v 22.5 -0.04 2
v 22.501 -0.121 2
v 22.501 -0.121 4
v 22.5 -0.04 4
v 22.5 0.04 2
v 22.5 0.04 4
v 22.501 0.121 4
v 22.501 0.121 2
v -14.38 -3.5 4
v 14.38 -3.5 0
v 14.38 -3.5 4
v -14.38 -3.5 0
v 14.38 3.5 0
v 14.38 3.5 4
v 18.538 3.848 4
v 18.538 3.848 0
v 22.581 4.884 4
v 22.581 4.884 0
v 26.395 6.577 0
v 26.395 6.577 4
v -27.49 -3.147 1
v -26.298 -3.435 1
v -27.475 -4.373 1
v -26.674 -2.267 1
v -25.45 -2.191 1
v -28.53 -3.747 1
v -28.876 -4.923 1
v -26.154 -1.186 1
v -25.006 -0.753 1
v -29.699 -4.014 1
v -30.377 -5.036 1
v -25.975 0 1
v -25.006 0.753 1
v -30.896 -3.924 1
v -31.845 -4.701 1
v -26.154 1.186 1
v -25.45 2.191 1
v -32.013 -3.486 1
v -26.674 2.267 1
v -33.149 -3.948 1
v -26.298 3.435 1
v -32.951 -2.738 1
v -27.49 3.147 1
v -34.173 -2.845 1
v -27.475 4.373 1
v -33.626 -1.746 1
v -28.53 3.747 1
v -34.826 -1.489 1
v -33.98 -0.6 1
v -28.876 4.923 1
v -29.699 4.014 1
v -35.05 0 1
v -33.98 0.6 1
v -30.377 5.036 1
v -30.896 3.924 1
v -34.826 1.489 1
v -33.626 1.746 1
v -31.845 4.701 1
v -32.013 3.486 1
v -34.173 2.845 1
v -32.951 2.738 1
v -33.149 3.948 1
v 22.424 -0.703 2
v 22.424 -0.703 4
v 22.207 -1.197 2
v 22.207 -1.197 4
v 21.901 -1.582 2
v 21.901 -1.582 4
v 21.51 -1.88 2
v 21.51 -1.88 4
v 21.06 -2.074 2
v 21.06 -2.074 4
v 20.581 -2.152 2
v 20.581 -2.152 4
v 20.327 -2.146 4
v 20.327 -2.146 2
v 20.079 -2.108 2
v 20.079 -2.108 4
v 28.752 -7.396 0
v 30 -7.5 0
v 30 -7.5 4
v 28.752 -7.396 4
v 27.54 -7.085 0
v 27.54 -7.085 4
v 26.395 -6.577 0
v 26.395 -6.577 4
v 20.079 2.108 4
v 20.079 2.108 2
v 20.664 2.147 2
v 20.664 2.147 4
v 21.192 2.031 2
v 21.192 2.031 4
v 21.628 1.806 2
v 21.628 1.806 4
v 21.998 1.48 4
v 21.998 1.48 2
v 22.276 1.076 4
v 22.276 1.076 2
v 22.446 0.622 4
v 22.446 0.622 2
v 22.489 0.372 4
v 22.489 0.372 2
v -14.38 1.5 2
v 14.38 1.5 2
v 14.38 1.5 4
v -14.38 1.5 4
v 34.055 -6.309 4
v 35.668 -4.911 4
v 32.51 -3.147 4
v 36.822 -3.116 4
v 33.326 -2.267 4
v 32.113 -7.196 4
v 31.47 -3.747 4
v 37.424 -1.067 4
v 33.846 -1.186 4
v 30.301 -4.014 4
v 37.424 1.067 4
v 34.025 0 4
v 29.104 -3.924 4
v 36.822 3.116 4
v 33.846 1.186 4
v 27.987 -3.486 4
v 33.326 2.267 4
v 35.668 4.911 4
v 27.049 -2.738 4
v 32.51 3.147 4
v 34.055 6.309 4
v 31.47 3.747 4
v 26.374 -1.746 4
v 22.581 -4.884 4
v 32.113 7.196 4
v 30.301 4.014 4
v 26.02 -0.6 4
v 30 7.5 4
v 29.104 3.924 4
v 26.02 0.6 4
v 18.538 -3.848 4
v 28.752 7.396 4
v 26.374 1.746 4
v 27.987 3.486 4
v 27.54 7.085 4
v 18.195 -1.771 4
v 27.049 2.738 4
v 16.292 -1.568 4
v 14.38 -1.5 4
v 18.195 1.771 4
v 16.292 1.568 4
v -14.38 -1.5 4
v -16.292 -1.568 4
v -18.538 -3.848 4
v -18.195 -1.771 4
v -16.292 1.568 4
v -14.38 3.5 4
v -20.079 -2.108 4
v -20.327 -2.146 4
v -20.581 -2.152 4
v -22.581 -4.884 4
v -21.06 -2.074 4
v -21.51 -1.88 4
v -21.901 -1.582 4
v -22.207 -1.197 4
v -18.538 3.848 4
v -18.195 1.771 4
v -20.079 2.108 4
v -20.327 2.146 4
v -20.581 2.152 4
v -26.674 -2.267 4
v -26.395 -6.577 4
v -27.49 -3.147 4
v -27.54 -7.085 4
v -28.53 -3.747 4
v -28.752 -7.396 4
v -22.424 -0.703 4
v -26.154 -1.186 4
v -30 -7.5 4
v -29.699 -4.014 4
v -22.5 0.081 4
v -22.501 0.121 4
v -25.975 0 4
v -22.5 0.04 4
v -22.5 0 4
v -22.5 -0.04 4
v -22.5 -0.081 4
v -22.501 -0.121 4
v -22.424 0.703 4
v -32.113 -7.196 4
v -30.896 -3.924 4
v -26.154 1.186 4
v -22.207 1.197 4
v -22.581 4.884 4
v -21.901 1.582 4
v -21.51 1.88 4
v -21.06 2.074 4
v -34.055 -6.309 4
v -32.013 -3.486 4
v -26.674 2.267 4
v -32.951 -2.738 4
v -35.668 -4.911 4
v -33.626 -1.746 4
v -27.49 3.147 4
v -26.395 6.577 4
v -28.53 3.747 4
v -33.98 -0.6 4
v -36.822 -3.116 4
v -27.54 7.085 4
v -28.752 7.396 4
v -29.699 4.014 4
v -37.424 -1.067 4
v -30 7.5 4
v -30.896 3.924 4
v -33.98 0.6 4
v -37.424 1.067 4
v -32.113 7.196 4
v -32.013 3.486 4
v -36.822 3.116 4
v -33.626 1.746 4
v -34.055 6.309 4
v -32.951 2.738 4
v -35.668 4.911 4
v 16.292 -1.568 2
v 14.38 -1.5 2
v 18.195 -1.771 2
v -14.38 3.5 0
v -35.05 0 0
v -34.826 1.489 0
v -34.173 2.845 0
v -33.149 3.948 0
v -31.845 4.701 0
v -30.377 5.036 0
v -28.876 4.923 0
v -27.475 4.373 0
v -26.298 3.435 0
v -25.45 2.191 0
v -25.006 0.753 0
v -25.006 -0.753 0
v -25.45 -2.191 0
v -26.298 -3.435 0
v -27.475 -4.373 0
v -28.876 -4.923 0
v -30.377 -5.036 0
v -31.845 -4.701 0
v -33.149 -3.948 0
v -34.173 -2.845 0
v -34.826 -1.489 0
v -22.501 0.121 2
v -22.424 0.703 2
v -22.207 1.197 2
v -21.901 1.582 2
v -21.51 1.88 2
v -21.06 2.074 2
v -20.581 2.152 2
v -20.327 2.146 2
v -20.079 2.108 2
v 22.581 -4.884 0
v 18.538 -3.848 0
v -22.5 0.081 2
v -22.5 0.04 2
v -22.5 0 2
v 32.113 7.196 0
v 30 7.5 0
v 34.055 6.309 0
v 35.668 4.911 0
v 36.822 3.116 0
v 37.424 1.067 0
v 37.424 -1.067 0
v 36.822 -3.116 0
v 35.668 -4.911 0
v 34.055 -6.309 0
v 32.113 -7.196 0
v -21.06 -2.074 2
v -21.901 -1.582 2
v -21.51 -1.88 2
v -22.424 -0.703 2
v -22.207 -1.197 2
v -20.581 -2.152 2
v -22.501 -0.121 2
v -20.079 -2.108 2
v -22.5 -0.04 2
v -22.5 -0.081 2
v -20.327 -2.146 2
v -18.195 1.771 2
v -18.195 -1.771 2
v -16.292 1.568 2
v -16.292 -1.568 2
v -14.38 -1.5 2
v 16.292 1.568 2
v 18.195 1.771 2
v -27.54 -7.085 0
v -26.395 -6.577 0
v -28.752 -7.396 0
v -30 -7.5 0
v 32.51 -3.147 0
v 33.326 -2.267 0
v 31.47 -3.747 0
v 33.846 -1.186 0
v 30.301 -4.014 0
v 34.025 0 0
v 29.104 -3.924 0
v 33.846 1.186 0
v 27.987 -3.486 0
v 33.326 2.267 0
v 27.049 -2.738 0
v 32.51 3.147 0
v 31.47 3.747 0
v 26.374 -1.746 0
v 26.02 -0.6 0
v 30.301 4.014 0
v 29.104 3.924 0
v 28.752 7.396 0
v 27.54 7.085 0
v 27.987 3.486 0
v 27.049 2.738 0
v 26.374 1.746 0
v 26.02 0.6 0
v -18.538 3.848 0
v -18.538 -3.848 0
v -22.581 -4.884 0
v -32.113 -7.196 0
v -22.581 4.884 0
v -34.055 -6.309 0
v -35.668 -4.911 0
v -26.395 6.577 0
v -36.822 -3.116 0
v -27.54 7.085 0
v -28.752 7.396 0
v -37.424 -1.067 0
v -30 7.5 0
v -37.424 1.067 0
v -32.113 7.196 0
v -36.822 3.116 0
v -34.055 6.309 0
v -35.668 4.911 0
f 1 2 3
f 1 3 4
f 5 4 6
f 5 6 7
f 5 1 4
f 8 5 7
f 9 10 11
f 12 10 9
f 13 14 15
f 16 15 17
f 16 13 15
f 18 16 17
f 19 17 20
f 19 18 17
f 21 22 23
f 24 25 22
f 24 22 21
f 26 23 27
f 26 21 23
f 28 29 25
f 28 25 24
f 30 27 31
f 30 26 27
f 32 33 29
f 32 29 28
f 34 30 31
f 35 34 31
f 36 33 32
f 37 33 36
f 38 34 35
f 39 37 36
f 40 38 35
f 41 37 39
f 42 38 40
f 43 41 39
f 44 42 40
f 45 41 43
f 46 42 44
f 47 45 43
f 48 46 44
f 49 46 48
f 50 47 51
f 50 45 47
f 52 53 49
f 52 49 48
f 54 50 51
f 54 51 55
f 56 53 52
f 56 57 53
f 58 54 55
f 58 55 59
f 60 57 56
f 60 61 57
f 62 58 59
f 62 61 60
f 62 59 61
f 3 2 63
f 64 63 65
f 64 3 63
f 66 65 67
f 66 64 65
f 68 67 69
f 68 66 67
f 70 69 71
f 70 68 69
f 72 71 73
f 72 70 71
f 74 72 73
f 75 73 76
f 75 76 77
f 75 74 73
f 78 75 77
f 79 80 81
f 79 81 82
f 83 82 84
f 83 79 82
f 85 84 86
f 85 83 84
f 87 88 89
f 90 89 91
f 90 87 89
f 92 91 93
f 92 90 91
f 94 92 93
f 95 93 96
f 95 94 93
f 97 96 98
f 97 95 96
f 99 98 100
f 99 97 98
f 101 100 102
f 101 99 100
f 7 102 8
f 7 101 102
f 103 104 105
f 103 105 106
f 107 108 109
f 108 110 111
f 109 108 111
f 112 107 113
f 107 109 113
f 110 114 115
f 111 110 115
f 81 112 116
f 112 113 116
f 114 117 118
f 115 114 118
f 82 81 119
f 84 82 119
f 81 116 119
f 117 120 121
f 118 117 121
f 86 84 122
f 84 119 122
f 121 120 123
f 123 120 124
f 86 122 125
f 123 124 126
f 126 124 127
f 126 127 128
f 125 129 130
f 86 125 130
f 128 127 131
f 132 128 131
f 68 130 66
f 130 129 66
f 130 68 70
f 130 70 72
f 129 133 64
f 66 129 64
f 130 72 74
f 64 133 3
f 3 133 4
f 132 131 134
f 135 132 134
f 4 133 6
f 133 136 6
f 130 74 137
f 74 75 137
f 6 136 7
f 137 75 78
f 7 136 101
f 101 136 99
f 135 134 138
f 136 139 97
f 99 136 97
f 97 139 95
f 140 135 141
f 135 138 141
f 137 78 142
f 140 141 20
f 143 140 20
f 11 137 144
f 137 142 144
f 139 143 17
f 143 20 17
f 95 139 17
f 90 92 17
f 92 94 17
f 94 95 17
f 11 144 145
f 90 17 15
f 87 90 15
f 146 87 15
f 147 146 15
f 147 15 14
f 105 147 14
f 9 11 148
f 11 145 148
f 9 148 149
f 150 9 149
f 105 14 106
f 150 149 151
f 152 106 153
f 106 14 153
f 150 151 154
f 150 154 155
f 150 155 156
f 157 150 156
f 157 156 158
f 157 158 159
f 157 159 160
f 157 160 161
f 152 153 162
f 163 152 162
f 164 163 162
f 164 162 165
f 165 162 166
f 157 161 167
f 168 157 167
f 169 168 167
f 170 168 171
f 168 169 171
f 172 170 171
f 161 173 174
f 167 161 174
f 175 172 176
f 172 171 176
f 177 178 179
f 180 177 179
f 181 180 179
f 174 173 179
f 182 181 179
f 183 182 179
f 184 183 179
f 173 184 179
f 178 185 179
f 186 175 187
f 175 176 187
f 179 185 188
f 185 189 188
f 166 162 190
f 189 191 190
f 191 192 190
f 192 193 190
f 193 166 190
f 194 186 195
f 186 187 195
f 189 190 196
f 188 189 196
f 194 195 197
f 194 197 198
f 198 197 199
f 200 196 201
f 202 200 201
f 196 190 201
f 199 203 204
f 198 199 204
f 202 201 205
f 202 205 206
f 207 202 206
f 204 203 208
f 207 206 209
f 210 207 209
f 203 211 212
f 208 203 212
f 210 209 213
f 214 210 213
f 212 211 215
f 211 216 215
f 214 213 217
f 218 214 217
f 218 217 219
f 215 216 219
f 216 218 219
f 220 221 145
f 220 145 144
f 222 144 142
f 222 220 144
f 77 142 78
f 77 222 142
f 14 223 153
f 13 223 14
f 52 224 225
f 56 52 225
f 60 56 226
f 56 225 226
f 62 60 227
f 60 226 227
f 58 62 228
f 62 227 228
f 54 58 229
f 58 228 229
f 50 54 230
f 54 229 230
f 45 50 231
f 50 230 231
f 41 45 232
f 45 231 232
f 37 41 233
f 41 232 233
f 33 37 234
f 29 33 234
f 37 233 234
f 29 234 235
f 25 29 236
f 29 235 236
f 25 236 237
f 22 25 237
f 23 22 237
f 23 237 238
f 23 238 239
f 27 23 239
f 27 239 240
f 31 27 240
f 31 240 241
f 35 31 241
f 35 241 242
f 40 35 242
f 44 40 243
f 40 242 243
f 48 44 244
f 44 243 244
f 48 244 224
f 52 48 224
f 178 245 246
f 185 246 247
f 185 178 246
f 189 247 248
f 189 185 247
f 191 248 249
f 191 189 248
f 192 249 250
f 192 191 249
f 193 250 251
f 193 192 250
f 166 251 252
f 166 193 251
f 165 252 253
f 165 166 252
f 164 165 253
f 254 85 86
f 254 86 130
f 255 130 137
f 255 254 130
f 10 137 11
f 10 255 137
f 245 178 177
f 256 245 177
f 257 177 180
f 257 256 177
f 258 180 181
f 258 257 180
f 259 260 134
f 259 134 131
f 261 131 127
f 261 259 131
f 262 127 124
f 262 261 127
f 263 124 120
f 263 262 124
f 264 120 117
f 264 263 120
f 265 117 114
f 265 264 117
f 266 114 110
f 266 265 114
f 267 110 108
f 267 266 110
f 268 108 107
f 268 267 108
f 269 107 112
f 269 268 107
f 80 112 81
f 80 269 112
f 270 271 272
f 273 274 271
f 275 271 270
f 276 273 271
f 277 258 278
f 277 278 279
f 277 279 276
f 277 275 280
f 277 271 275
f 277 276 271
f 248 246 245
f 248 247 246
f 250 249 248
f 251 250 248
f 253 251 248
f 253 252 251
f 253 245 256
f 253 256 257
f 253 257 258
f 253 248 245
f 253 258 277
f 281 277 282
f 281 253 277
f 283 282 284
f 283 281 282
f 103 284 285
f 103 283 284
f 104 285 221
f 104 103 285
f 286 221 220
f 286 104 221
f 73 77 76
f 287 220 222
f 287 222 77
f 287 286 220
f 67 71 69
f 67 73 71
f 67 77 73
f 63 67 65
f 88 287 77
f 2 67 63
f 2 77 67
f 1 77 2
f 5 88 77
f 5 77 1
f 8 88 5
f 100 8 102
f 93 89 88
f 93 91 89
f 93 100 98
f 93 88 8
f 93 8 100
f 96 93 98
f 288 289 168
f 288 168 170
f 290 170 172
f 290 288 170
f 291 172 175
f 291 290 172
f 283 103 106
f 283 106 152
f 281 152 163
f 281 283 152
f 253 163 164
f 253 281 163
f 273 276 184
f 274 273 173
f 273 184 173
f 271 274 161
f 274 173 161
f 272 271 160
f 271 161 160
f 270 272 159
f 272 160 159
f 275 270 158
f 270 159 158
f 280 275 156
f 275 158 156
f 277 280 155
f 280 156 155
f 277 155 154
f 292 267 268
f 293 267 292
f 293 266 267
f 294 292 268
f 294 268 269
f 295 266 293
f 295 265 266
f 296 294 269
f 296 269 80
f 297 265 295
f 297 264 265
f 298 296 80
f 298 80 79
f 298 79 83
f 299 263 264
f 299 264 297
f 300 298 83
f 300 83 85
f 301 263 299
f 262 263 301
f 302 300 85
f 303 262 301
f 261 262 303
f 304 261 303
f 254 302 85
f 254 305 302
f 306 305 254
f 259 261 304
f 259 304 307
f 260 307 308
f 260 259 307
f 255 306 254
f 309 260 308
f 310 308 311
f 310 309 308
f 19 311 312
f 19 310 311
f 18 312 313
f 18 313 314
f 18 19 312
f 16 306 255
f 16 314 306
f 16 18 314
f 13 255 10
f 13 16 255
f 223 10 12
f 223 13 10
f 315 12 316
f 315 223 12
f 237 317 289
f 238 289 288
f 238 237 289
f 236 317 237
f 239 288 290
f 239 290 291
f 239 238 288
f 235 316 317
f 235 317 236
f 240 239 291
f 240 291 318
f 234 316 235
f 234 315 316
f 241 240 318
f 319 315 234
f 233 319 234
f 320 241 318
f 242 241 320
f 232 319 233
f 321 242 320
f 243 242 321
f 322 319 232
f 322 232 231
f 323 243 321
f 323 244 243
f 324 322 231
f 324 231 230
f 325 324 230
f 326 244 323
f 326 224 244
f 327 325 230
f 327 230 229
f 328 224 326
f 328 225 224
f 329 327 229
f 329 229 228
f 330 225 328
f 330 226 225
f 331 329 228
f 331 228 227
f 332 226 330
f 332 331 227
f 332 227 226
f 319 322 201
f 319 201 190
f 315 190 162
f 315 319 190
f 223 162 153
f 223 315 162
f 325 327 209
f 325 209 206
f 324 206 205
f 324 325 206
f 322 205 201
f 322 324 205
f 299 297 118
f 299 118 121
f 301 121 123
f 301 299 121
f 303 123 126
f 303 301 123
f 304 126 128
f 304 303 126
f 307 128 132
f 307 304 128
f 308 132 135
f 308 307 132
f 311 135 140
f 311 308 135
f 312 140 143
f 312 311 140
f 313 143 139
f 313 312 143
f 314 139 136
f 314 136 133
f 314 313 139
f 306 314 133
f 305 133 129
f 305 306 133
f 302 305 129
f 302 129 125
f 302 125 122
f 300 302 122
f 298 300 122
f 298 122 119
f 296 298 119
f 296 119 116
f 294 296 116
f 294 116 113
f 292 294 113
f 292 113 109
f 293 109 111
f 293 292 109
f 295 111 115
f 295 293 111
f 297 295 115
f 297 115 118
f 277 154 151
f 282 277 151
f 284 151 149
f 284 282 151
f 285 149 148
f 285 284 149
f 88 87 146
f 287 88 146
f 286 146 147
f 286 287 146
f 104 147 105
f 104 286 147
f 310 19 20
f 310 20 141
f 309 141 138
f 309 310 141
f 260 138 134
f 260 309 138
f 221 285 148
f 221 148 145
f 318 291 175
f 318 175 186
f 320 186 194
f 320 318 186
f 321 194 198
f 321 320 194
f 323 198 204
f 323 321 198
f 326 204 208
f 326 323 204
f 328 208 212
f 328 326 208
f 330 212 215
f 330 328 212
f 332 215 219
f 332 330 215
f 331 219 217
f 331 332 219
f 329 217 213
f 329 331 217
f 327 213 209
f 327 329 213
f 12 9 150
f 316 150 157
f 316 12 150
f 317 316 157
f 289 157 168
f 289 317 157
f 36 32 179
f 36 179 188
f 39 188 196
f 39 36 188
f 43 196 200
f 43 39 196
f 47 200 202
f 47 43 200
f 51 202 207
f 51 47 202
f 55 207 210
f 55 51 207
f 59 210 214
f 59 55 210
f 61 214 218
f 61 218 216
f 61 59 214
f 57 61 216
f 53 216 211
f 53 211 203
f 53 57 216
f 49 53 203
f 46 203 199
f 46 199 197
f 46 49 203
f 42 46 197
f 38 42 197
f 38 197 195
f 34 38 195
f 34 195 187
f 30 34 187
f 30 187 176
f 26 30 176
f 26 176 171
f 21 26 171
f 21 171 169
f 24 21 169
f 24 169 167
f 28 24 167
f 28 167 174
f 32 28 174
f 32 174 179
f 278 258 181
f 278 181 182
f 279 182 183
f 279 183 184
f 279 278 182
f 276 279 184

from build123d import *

# Parameters (mm, degrees)
SKETCH_1_R          = 4.025
EXTRUDE_1_DEPTH     = 4
CUT_EXTRUDE_START   = -10
CUT_EXTRUDE_1_DEPTH = 10
SKETCH_4_R          = 5.05
CUT_EXTRUDE_2_DEPTH = 1
CUT_EXTRUDE_START_2 = -2
CUT_EXTRUDE_3_DEPTH = 2
FILLET_2_R          = 2


with BuildPart() as part:
    # 草图1 → 凸台-拉伸1 (new body)
    with BuildSketch(Plane.XY):
        with BuildLine():
            Line((-30, 7.5), (30, 7.5))
            ThreePointArc((30, 7.5), (37.5, 0), (30, -7.5))
            Line((30, -7.5), (-30, -7.5))
            ThreePointArc((-30, -7.5), (-37.5, 0), (-30, 7.5))
        make_face()
        with Locations((-30, 0)):
            Circle(SKETCH_1_R, mode=Mode.SUBTRACT)
        with Locations((30, 0)):
            Circle(SKETCH_1_R, mode=Mode.SUBTRACT)
    extrude(amount=EXTRUDE_1_DEPTH)

    # 草图2 → 切除-拉伸1 (cut)
    with BuildSketch(Plane.XY.offset(4).offset(CUT_EXTRUDE_START)):
        with BuildLine():
            ThreePointArc((-26.39526938, 6.576923077), (-20.581237378, 4.281443859), (-14.379500648, 3.5))
            Line((-14.379500648, 3.5), (14.379500648, 3.5))
            ThreePointArc((14.379500648, 3.5), (20.581237378, 4.281443859), (26.39526938, 6.576923077))
            ThreePointArc((26.39526938, 6.576923077), (28.139478981, 7.265566842), (30, 7.5))
            Line((30, 7.5), (-30, 7.5))
            ThreePointArc((-30, 7.5), (-28.139478981, 7.265566842), (-26.39526938, 6.576923077))
        make_face()
        with BuildLine():
            ThreePointArc((-26.39526938, -6.576923077), (-28.139478981, -7.265566842), (-30, -7.5))
            Line((-30, -7.5), (30, -7.5))
            ThreePointArc((30, -7.5), (28.139478981, -7.265566842), (26.39526938, -6.576923077))
            ThreePointArc((26.39526938, -6.576923077), (20.581237378, -4.281443859), (14.379500648, -3.5))
            Line((14.379500648, -3.5), (-14.379500648, -3.5))
            ThreePointArc((-14.379500648, -3.5), (-20.581237378, -4.281443859), (-26.39526938, -6.576923077))
        make_face()
    extrude(amount=CUT_EXTRUDE_1_DEPTH, mode=Mode.SUBTRACT)

    # 草图4 → 切除-拉伸2 (cut)
    with BuildSketch(Plane(origin=(0, 0, 0), x_dir=(-1, 0, 0), z_dir=(0, 0, -1))):
        with Locations((30, 0)):
            Circle(SKETCH_4_R)
    extrude(amount=-CUT_EXTRUDE_2_DEPTH, mode=Mode.SUBTRACT)

    # 草图5 → 切除-拉伸3 (cut)
    with BuildSketch(Plane.XY.offset(4).offset(CUT_EXTRUDE_START_2)):
        with BuildLine():
            ThreePointArc((-23.103831173, -2.948364888), (-18.801369709, -1.864552303), (-14.379500648, -1.5))
            Line((-14.379500648, -1.5), (14.379500648, -1.5))
            ThreePointArc((14.379500648, -1.5), (18.801369709, -1.864552303), (23.103831173, -2.948364888))
            ThreePointArc((23.103831173, -2.948364888), (22.5, 0), (23.103831173, 2.948364888))
            ThreePointArc((23.103831173, 2.948364888), (18.801369709, 1.864552303), (14.379500648, 1.5))
            Line((14.379500648, 1.5), (-14.379500648, 1.5))
            ThreePointArc((-14.379500648, 1.5), (-18.801369709, 1.864552303), (-23.103831173, 2.948364888))
            ThreePointArc((-23.103831173, 2.948364888), (-22.65250838, 1.504781346), (-22.5, 0))
            ThreePointArc((-22.5, 0), (-22.65250838, -1.504781346), (-23.103831173, -2.948364888))
        make_face()
    extrude(amount=CUT_EXTRUDE_3_DEPTH, mode=Mode.SUBTRACT)

    # 圆角2
    fillet_2_edges = [part.edges().sort_by_distance(p)[0] for p in [
        (23.103831173, 2.948364888, 3),
        (23.103831173, -2.948364888, 3),
        (-23.103831173, -2.948364888, 3),
        (-23.103831173, 2.948364888, 3),
    ]]
    fillet(fillet_2_edges, radius=FILLET_2_R)


solid = part.part
